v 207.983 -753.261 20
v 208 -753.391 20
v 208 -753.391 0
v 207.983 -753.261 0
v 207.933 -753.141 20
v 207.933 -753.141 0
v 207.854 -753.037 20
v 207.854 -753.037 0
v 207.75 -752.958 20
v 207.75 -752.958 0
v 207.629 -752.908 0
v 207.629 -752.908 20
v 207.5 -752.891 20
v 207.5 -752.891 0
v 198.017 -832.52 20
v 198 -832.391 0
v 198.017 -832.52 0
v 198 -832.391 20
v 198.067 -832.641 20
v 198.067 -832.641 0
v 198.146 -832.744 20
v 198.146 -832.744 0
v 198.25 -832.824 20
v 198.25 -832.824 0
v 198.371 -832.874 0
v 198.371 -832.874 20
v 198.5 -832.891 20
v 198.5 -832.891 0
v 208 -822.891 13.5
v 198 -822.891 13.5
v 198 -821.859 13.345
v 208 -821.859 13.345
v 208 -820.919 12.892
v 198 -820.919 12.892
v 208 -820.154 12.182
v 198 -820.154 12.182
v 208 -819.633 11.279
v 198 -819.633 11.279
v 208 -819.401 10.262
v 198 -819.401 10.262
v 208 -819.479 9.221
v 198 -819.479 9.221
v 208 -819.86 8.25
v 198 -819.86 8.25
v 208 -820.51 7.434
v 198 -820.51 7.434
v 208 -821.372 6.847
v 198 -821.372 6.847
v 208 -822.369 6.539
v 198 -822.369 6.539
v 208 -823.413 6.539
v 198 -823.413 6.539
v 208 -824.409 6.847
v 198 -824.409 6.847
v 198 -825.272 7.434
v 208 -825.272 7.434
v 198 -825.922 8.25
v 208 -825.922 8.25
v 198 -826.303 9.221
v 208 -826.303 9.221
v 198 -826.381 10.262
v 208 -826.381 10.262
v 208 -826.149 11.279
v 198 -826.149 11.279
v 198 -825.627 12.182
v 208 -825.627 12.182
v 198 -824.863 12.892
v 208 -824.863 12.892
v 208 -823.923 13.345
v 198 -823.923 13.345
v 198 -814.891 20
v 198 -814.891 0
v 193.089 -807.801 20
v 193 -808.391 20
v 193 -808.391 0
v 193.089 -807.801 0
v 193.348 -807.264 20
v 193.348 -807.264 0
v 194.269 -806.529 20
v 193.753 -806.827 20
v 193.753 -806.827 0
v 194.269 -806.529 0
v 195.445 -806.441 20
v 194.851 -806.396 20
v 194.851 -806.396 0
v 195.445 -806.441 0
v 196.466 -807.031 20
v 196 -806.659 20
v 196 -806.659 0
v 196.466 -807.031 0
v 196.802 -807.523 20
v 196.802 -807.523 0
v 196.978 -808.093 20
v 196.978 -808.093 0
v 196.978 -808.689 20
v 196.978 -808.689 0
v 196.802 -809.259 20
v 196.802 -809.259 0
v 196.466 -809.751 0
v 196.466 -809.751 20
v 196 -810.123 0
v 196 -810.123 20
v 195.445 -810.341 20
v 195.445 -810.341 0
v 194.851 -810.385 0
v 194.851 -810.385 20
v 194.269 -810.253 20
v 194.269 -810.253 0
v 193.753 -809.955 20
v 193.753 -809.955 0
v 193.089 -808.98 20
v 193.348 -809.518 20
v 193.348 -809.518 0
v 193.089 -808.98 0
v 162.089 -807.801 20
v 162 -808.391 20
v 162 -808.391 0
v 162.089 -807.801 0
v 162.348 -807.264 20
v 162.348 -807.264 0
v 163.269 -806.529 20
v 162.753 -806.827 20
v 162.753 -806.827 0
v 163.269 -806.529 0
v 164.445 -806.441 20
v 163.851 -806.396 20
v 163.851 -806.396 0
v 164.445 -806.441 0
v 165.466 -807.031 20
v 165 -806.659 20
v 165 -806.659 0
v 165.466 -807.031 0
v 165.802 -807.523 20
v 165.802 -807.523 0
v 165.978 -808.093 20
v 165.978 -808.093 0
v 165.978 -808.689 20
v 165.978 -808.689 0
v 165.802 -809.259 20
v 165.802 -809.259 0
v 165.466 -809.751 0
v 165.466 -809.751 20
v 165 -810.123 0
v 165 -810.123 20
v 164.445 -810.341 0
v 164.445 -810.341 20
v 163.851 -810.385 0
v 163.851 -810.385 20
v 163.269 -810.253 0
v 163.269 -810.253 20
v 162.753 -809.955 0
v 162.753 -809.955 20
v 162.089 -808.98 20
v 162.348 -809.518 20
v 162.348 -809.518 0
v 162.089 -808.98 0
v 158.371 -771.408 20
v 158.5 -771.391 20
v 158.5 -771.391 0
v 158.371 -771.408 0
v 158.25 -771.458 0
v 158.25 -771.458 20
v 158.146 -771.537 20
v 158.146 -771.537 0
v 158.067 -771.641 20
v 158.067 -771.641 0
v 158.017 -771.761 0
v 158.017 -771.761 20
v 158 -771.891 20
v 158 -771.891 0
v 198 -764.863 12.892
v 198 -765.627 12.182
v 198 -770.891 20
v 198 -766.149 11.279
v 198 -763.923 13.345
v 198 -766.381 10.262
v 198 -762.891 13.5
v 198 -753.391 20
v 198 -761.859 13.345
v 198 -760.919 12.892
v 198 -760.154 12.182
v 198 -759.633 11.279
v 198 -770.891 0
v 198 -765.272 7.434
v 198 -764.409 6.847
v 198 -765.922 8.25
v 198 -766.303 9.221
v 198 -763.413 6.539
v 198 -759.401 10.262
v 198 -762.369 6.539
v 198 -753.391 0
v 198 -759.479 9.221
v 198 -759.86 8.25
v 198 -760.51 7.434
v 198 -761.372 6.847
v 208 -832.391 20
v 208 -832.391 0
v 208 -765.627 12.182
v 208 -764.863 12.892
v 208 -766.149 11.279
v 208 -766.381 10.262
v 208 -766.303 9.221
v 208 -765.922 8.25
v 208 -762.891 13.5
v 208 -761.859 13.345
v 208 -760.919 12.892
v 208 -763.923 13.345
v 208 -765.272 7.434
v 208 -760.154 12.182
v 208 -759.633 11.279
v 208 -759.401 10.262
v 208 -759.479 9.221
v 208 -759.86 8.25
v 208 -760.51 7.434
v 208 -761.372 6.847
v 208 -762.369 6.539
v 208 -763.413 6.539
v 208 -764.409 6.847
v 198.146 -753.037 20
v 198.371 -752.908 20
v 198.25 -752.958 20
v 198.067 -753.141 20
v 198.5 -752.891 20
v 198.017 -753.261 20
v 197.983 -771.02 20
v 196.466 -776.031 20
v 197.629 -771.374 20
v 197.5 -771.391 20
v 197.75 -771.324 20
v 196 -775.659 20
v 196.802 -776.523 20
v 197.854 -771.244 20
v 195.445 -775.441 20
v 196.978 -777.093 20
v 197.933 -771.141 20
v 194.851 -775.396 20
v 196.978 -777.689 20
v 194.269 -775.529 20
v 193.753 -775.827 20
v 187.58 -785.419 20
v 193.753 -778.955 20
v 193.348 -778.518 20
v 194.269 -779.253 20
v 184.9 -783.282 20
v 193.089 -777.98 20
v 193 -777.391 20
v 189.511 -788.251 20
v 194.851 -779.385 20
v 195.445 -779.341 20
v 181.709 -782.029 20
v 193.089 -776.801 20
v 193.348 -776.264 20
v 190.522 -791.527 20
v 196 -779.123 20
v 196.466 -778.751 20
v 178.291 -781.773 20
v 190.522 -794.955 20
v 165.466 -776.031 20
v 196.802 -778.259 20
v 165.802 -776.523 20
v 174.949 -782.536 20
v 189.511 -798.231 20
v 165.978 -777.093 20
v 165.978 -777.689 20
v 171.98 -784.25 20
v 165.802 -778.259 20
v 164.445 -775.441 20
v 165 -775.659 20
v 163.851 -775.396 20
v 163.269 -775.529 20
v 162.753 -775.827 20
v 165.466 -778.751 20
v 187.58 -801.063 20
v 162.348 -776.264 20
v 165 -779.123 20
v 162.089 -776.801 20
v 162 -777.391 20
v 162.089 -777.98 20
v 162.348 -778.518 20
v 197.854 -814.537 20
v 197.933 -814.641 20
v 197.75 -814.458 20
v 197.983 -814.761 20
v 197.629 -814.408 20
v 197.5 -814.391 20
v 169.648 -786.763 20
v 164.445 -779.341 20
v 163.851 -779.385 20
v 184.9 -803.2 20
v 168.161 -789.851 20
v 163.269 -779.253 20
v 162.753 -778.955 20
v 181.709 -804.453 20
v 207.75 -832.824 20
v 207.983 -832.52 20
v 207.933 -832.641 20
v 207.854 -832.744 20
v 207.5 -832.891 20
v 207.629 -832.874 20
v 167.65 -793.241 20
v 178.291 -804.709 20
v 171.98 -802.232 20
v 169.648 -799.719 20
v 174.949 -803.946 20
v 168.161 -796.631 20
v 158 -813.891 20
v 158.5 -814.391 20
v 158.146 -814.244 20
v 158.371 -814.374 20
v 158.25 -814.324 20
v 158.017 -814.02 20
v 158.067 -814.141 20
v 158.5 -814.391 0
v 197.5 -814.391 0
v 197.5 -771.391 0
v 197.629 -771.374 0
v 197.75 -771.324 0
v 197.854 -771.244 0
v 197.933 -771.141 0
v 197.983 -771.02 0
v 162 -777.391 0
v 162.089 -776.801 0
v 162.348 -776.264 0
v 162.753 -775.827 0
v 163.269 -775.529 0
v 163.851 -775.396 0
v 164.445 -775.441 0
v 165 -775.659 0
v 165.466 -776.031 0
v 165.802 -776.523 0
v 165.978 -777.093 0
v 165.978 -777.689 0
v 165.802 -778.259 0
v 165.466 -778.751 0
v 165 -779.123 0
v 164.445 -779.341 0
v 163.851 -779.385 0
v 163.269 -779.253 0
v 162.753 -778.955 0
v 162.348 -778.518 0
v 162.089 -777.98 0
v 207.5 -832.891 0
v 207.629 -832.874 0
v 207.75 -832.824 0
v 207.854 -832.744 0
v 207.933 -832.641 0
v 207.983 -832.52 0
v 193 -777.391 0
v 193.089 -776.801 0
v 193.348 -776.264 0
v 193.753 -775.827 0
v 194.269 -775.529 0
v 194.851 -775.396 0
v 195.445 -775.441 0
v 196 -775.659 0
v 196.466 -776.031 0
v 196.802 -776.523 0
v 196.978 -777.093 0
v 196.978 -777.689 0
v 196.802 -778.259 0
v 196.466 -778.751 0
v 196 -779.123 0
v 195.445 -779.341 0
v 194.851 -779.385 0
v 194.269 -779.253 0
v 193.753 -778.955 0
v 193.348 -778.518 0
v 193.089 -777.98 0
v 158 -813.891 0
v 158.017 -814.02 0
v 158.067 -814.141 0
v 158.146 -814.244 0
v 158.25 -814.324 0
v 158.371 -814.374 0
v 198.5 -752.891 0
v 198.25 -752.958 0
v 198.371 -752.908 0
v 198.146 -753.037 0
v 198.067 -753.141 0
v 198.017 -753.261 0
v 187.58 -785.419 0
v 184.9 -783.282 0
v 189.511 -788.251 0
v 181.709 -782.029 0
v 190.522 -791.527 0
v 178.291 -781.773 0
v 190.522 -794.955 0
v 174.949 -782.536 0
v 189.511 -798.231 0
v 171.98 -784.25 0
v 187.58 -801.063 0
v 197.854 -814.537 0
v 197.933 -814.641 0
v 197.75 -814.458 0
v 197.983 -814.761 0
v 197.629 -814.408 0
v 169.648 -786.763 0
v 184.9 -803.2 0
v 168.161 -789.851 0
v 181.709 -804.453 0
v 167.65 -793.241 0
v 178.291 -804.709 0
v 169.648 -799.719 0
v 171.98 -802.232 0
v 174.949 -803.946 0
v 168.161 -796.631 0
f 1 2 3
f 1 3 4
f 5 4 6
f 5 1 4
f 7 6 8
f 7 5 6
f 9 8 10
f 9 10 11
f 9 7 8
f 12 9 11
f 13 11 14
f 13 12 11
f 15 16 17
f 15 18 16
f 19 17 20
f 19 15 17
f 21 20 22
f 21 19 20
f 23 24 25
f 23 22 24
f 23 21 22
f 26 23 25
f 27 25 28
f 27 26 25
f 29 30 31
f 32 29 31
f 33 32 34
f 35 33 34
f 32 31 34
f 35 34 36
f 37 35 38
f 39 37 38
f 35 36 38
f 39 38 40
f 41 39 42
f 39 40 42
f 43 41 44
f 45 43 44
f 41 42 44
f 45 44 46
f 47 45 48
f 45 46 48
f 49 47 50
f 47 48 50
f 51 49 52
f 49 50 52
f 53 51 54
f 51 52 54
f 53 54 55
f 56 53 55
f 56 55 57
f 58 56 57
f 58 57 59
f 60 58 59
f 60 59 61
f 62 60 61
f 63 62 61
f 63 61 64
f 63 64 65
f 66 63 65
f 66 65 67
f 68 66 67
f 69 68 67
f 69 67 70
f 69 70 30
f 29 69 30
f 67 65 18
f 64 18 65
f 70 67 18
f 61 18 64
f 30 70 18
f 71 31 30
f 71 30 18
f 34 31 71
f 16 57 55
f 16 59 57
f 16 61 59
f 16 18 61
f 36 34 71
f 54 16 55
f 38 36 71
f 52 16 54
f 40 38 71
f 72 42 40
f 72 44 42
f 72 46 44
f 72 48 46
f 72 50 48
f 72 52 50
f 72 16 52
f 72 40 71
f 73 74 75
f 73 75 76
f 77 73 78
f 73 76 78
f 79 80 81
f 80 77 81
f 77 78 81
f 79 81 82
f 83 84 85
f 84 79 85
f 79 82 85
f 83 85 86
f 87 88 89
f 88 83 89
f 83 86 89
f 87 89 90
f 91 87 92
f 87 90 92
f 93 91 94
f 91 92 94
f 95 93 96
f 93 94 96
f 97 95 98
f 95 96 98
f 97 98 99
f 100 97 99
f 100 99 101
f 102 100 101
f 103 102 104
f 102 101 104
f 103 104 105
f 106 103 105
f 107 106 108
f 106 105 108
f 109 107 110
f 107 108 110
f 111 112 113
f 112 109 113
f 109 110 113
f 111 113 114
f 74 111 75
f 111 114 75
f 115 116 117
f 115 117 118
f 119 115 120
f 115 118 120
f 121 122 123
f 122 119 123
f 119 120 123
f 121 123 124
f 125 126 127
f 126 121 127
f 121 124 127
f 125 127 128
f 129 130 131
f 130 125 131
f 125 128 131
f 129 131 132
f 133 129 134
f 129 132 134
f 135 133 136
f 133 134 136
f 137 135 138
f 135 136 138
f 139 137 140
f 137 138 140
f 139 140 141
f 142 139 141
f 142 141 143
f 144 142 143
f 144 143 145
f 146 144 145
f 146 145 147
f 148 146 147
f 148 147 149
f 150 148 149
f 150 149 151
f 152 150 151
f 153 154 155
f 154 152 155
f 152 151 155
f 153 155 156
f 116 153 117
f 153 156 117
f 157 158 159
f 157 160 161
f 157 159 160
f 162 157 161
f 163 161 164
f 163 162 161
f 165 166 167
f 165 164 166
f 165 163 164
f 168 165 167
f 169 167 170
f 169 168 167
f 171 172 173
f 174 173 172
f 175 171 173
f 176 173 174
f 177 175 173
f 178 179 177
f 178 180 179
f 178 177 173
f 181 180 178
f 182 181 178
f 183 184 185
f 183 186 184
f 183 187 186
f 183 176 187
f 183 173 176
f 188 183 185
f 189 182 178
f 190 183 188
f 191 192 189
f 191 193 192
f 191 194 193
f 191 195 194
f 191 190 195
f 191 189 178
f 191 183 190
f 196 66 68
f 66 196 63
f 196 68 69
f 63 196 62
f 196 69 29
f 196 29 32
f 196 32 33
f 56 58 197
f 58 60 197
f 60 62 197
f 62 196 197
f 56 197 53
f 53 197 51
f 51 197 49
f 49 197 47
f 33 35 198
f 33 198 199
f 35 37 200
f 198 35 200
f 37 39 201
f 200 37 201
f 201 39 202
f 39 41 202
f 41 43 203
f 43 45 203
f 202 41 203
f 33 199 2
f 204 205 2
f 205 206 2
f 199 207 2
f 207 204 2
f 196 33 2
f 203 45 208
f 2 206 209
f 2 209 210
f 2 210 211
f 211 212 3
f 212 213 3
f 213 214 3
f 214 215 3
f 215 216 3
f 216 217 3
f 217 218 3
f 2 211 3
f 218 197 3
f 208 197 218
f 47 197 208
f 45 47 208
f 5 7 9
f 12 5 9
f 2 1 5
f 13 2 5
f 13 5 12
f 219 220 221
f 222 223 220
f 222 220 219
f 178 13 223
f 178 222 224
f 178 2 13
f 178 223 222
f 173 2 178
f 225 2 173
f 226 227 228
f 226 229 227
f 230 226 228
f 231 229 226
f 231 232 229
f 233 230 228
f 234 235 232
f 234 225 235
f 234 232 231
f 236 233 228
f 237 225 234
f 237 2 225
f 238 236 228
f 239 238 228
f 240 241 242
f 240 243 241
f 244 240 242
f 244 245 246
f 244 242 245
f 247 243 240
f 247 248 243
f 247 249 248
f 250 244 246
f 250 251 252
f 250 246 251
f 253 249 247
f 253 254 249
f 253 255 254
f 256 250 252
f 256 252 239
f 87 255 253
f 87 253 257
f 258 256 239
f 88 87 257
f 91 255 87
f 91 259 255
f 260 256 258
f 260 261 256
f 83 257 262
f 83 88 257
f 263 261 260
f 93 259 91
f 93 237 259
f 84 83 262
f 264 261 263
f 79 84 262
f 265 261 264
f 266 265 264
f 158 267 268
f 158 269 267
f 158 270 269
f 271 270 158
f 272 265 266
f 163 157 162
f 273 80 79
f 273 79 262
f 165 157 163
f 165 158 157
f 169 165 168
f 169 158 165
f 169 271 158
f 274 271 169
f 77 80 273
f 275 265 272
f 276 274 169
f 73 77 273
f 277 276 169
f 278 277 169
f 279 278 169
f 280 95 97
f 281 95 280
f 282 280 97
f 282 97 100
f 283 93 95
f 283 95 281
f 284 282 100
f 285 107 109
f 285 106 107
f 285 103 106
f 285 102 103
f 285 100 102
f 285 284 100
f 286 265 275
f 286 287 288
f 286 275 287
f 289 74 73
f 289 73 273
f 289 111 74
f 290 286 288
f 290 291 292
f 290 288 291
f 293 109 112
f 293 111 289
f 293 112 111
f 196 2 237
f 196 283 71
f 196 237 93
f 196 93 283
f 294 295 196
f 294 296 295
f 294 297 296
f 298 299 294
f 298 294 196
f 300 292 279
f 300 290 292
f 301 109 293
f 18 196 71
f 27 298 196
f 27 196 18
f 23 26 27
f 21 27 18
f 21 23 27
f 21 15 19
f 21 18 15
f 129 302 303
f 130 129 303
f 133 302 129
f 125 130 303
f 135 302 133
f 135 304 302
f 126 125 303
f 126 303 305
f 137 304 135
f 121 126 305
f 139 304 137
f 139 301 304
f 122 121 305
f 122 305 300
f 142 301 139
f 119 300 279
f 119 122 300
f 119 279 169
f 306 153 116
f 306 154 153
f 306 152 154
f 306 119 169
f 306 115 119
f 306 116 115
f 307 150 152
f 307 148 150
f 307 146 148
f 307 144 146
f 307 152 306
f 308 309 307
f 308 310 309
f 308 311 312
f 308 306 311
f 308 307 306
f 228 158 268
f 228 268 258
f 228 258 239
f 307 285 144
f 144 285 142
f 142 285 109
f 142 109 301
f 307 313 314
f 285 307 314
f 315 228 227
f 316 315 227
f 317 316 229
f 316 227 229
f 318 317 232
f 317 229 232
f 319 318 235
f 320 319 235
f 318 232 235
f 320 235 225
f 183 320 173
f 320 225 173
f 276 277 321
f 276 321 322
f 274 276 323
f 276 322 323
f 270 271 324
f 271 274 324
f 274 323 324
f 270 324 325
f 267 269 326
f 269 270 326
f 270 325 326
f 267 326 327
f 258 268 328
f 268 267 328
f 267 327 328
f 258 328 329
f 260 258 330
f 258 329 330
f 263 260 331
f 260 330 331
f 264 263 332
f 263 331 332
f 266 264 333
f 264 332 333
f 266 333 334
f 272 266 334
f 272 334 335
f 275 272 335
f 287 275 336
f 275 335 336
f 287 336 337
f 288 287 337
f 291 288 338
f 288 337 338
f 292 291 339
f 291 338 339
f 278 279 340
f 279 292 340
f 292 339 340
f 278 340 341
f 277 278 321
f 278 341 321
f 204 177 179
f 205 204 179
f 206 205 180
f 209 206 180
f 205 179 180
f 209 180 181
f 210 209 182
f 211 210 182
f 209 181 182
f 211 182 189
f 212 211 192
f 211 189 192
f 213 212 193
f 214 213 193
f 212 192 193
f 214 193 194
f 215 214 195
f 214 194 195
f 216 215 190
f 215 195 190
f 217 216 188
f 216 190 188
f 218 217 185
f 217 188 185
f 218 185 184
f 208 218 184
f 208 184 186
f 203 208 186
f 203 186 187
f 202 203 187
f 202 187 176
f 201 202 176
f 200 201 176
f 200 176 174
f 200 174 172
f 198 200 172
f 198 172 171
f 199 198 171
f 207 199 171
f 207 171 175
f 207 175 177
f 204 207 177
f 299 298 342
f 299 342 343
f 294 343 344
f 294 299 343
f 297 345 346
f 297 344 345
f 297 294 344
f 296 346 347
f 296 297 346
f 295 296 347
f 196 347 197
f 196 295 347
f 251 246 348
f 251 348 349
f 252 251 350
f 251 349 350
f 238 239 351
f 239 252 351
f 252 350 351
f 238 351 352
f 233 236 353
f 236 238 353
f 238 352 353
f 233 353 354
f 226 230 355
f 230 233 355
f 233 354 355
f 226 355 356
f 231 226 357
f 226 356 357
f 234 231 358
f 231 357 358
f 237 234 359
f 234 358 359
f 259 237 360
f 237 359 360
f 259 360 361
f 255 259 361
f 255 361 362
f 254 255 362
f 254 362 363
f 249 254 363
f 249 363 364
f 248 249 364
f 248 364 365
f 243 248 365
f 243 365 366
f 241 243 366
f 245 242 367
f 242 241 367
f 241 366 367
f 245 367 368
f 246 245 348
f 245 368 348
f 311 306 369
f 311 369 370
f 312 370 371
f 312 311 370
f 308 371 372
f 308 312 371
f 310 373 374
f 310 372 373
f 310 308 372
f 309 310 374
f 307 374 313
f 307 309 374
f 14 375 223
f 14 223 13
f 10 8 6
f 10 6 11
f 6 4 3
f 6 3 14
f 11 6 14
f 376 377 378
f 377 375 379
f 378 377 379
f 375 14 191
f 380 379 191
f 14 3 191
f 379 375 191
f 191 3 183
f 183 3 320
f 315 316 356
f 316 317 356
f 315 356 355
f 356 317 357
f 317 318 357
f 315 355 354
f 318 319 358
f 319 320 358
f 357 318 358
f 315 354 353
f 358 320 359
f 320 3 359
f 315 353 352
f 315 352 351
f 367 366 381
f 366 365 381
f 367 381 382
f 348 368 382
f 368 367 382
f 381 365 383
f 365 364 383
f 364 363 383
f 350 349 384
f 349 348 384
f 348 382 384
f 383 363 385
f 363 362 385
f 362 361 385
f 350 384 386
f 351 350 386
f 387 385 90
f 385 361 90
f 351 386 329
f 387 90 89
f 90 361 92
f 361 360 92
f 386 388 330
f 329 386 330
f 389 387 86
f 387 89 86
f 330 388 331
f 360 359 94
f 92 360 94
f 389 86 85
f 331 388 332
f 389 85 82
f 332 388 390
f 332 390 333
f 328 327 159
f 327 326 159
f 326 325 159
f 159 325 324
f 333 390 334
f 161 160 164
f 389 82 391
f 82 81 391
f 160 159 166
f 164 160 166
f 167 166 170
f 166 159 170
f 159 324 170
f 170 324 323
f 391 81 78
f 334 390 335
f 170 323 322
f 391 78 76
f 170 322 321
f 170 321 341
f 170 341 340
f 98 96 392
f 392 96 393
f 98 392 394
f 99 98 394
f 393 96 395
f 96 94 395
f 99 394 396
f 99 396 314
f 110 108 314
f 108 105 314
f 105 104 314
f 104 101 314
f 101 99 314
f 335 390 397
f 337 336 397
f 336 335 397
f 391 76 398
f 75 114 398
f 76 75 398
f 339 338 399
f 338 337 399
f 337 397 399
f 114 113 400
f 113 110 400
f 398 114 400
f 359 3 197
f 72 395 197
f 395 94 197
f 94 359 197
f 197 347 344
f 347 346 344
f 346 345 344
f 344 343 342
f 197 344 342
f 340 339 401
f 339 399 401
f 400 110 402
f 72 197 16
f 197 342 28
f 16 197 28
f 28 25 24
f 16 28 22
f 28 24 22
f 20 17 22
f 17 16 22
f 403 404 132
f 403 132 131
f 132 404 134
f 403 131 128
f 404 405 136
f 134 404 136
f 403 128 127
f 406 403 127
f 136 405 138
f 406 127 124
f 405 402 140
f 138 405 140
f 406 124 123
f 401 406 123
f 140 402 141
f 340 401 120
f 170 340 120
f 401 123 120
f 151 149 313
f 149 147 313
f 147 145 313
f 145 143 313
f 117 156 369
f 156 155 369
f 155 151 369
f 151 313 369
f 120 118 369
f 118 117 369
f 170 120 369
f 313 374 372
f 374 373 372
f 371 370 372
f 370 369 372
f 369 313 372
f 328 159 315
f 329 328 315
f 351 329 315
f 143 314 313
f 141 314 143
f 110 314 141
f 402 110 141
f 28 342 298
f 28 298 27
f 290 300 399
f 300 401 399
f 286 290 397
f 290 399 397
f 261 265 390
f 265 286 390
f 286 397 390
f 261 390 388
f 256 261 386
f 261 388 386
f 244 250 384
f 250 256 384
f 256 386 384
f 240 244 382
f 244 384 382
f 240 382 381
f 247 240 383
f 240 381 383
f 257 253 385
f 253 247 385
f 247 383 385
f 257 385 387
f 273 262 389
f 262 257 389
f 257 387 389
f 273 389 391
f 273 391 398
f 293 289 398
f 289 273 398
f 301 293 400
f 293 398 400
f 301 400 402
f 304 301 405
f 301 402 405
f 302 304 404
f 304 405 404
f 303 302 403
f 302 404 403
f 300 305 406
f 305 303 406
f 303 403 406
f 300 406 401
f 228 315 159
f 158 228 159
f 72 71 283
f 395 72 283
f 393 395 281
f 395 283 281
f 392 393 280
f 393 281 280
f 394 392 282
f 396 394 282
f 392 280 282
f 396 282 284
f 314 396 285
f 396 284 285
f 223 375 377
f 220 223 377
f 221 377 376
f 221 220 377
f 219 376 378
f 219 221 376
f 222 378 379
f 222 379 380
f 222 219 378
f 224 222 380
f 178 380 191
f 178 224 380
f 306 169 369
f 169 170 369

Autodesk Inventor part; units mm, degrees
ref_plane "YZ Plane" through (0, 0, 0) normal (1, 0, 0) x (0, 1, 0)
ref_plane "XZ Plane" through (0, 0, 0) normal (0, 1, 0) x (-1, 0, 0)
ref_plane "Work Plane1" through (0, -862.1118, 0) normal (0, 0, 1) x (-1, 0, 0)
sketch "Sketch1" plane through (0, -862.1118, 0) normal (0, 0, 1) x (-1, 0, 0)
  circle A0 centre (-188, -18) radius 4 projected
  line L0 (-220, -478) -> (-220, 22) projected
  line L1 (-220, -478) -> (-208, -478) projected
  line L2 (-208, 22) -> (-208, -478) projected
  line L3 (-220, 22) -> (-208, 22) projected
  line L4 (-208, -29.2209) -> (-198, -29.2209)
  line L5 (-198, -109.2209) -> (-208, -109.2209)
  line L6 (-208, -109.2209) -> (-208, -29.2209)
  line L7 (-158, -47.7209) -> (-198, -47.7209)
  line L8 (-198, -90.7209) -> (-158, -90.7209)
  line L9 (-158, -90.7209) -> (-158, -47.7209)
  circle A1 centre (-179.15, -68.8709) radius 11.5
  circle A2 centre (-164, -53.7209) radius 2
  circle A3 centre (-195, -53.7209) radius 2
  circle A4 centre (-195, -84.7209) radius 2
  circle A5 centre (-164, -84.7209) radius 2
  line L10 (-195, -84.7209) -> (-195, -53.7209) construction
  line L11 (-195, -84.7209) -> (-164, -84.7209) construction
  line L12 (-198, -29.2209) -> (-198, -47.7209)
  line L13 (-198, -90.7209) -> (-198, -109.2209)
  point P0 (0, -862.1118)
  dimension "d0" = 10
  dimension "d1" = 80
  dimension "d3" = 43
  dimension "d4" = 18.5
  dimension "d5" = 18.5
  dimension "d6" = 23
  dimension "d7" = 4
  dimension "d8" = 4
  dimension "d9" = 4
  dimension "d10" = 4
  dimension "d11" = 31
  dimension "d12" = 31
  dimension "d13" = 31
  dimension "d14" = 31
  dimension "d15" = 6
  dimension "d18" = 6
  dimension "d19" = 6
  dimension "d20" = 6
  dimension "d21" = 90
  dimension "d25" = 21.15
  dimension "d26" = 21.15
  dimension "d27" = 90
  dimension "d28" = 90
  dimension "d29" = 18.5
  dimension "d41" = 40
  dimension "d42" = 40
extrude "Tykkelse" add sketch "Sketch1" along normal blind 20 contours L2 L4 L12 L7 L9 L8 L13 L5
sketch "Sketch2" plane through (198, -832.8909, 0) normal (-1, 0, 0) x (0, 0, 1)
  line L0 (0, 0) -> (20, 0) projected
  line L1 (20, 18.5) -> (20, 0) projected
  line L2 (0, 80) -> (0, 61.5) projected
  line L3 (0, 61.5) -> (20, 61.5) projected
  line L4 (20, 80) -> (20, 61.5) projected
  line L5 (0, 80) -> (20, 80) projected
  circle A0 centre (10, 70) radius 3.5
  circle A1 centre (10, 10) radius 3.5
  point P0 (0, 832.8909)
  dimension "d32" = 7
  dimension "d33" = 7
  dimension "d34" = 10
  dimension "d35" = 10
  dimension "d36" = 10
  dimension "d37" = 10
extrude "Befæstelseshuller" cut sketch "Sketch2" against normal up to surface (10 mm away) contours A0 | A1
fillet "Fillet1" radius 0.5 8 edges at (198, -814.3909, 10) (198, -771.3909, 10) (158, -771.3909, 10) (158, -814.3909, 10) (198, -832.8909, 10) (208, -832.8909, 10) (198, -752.8909, 10) (208, -752.8909, 10)
equation "\"d4\" = d5"
equation "\"d8\" = d7"
equation "\"d9\" = d7"
equation "\"d10\" = d7"
equation "\"d13\" = d11"
equation "\"d14\" = d12"
equation "\"d15\" = d20"
equation "\"d18\" = d15"
equation "\"d19\" = d18"
equation "\"d42\" = d41"
properties part number "Stepper Holder X&Y_2" material "Aluminum 6061"
